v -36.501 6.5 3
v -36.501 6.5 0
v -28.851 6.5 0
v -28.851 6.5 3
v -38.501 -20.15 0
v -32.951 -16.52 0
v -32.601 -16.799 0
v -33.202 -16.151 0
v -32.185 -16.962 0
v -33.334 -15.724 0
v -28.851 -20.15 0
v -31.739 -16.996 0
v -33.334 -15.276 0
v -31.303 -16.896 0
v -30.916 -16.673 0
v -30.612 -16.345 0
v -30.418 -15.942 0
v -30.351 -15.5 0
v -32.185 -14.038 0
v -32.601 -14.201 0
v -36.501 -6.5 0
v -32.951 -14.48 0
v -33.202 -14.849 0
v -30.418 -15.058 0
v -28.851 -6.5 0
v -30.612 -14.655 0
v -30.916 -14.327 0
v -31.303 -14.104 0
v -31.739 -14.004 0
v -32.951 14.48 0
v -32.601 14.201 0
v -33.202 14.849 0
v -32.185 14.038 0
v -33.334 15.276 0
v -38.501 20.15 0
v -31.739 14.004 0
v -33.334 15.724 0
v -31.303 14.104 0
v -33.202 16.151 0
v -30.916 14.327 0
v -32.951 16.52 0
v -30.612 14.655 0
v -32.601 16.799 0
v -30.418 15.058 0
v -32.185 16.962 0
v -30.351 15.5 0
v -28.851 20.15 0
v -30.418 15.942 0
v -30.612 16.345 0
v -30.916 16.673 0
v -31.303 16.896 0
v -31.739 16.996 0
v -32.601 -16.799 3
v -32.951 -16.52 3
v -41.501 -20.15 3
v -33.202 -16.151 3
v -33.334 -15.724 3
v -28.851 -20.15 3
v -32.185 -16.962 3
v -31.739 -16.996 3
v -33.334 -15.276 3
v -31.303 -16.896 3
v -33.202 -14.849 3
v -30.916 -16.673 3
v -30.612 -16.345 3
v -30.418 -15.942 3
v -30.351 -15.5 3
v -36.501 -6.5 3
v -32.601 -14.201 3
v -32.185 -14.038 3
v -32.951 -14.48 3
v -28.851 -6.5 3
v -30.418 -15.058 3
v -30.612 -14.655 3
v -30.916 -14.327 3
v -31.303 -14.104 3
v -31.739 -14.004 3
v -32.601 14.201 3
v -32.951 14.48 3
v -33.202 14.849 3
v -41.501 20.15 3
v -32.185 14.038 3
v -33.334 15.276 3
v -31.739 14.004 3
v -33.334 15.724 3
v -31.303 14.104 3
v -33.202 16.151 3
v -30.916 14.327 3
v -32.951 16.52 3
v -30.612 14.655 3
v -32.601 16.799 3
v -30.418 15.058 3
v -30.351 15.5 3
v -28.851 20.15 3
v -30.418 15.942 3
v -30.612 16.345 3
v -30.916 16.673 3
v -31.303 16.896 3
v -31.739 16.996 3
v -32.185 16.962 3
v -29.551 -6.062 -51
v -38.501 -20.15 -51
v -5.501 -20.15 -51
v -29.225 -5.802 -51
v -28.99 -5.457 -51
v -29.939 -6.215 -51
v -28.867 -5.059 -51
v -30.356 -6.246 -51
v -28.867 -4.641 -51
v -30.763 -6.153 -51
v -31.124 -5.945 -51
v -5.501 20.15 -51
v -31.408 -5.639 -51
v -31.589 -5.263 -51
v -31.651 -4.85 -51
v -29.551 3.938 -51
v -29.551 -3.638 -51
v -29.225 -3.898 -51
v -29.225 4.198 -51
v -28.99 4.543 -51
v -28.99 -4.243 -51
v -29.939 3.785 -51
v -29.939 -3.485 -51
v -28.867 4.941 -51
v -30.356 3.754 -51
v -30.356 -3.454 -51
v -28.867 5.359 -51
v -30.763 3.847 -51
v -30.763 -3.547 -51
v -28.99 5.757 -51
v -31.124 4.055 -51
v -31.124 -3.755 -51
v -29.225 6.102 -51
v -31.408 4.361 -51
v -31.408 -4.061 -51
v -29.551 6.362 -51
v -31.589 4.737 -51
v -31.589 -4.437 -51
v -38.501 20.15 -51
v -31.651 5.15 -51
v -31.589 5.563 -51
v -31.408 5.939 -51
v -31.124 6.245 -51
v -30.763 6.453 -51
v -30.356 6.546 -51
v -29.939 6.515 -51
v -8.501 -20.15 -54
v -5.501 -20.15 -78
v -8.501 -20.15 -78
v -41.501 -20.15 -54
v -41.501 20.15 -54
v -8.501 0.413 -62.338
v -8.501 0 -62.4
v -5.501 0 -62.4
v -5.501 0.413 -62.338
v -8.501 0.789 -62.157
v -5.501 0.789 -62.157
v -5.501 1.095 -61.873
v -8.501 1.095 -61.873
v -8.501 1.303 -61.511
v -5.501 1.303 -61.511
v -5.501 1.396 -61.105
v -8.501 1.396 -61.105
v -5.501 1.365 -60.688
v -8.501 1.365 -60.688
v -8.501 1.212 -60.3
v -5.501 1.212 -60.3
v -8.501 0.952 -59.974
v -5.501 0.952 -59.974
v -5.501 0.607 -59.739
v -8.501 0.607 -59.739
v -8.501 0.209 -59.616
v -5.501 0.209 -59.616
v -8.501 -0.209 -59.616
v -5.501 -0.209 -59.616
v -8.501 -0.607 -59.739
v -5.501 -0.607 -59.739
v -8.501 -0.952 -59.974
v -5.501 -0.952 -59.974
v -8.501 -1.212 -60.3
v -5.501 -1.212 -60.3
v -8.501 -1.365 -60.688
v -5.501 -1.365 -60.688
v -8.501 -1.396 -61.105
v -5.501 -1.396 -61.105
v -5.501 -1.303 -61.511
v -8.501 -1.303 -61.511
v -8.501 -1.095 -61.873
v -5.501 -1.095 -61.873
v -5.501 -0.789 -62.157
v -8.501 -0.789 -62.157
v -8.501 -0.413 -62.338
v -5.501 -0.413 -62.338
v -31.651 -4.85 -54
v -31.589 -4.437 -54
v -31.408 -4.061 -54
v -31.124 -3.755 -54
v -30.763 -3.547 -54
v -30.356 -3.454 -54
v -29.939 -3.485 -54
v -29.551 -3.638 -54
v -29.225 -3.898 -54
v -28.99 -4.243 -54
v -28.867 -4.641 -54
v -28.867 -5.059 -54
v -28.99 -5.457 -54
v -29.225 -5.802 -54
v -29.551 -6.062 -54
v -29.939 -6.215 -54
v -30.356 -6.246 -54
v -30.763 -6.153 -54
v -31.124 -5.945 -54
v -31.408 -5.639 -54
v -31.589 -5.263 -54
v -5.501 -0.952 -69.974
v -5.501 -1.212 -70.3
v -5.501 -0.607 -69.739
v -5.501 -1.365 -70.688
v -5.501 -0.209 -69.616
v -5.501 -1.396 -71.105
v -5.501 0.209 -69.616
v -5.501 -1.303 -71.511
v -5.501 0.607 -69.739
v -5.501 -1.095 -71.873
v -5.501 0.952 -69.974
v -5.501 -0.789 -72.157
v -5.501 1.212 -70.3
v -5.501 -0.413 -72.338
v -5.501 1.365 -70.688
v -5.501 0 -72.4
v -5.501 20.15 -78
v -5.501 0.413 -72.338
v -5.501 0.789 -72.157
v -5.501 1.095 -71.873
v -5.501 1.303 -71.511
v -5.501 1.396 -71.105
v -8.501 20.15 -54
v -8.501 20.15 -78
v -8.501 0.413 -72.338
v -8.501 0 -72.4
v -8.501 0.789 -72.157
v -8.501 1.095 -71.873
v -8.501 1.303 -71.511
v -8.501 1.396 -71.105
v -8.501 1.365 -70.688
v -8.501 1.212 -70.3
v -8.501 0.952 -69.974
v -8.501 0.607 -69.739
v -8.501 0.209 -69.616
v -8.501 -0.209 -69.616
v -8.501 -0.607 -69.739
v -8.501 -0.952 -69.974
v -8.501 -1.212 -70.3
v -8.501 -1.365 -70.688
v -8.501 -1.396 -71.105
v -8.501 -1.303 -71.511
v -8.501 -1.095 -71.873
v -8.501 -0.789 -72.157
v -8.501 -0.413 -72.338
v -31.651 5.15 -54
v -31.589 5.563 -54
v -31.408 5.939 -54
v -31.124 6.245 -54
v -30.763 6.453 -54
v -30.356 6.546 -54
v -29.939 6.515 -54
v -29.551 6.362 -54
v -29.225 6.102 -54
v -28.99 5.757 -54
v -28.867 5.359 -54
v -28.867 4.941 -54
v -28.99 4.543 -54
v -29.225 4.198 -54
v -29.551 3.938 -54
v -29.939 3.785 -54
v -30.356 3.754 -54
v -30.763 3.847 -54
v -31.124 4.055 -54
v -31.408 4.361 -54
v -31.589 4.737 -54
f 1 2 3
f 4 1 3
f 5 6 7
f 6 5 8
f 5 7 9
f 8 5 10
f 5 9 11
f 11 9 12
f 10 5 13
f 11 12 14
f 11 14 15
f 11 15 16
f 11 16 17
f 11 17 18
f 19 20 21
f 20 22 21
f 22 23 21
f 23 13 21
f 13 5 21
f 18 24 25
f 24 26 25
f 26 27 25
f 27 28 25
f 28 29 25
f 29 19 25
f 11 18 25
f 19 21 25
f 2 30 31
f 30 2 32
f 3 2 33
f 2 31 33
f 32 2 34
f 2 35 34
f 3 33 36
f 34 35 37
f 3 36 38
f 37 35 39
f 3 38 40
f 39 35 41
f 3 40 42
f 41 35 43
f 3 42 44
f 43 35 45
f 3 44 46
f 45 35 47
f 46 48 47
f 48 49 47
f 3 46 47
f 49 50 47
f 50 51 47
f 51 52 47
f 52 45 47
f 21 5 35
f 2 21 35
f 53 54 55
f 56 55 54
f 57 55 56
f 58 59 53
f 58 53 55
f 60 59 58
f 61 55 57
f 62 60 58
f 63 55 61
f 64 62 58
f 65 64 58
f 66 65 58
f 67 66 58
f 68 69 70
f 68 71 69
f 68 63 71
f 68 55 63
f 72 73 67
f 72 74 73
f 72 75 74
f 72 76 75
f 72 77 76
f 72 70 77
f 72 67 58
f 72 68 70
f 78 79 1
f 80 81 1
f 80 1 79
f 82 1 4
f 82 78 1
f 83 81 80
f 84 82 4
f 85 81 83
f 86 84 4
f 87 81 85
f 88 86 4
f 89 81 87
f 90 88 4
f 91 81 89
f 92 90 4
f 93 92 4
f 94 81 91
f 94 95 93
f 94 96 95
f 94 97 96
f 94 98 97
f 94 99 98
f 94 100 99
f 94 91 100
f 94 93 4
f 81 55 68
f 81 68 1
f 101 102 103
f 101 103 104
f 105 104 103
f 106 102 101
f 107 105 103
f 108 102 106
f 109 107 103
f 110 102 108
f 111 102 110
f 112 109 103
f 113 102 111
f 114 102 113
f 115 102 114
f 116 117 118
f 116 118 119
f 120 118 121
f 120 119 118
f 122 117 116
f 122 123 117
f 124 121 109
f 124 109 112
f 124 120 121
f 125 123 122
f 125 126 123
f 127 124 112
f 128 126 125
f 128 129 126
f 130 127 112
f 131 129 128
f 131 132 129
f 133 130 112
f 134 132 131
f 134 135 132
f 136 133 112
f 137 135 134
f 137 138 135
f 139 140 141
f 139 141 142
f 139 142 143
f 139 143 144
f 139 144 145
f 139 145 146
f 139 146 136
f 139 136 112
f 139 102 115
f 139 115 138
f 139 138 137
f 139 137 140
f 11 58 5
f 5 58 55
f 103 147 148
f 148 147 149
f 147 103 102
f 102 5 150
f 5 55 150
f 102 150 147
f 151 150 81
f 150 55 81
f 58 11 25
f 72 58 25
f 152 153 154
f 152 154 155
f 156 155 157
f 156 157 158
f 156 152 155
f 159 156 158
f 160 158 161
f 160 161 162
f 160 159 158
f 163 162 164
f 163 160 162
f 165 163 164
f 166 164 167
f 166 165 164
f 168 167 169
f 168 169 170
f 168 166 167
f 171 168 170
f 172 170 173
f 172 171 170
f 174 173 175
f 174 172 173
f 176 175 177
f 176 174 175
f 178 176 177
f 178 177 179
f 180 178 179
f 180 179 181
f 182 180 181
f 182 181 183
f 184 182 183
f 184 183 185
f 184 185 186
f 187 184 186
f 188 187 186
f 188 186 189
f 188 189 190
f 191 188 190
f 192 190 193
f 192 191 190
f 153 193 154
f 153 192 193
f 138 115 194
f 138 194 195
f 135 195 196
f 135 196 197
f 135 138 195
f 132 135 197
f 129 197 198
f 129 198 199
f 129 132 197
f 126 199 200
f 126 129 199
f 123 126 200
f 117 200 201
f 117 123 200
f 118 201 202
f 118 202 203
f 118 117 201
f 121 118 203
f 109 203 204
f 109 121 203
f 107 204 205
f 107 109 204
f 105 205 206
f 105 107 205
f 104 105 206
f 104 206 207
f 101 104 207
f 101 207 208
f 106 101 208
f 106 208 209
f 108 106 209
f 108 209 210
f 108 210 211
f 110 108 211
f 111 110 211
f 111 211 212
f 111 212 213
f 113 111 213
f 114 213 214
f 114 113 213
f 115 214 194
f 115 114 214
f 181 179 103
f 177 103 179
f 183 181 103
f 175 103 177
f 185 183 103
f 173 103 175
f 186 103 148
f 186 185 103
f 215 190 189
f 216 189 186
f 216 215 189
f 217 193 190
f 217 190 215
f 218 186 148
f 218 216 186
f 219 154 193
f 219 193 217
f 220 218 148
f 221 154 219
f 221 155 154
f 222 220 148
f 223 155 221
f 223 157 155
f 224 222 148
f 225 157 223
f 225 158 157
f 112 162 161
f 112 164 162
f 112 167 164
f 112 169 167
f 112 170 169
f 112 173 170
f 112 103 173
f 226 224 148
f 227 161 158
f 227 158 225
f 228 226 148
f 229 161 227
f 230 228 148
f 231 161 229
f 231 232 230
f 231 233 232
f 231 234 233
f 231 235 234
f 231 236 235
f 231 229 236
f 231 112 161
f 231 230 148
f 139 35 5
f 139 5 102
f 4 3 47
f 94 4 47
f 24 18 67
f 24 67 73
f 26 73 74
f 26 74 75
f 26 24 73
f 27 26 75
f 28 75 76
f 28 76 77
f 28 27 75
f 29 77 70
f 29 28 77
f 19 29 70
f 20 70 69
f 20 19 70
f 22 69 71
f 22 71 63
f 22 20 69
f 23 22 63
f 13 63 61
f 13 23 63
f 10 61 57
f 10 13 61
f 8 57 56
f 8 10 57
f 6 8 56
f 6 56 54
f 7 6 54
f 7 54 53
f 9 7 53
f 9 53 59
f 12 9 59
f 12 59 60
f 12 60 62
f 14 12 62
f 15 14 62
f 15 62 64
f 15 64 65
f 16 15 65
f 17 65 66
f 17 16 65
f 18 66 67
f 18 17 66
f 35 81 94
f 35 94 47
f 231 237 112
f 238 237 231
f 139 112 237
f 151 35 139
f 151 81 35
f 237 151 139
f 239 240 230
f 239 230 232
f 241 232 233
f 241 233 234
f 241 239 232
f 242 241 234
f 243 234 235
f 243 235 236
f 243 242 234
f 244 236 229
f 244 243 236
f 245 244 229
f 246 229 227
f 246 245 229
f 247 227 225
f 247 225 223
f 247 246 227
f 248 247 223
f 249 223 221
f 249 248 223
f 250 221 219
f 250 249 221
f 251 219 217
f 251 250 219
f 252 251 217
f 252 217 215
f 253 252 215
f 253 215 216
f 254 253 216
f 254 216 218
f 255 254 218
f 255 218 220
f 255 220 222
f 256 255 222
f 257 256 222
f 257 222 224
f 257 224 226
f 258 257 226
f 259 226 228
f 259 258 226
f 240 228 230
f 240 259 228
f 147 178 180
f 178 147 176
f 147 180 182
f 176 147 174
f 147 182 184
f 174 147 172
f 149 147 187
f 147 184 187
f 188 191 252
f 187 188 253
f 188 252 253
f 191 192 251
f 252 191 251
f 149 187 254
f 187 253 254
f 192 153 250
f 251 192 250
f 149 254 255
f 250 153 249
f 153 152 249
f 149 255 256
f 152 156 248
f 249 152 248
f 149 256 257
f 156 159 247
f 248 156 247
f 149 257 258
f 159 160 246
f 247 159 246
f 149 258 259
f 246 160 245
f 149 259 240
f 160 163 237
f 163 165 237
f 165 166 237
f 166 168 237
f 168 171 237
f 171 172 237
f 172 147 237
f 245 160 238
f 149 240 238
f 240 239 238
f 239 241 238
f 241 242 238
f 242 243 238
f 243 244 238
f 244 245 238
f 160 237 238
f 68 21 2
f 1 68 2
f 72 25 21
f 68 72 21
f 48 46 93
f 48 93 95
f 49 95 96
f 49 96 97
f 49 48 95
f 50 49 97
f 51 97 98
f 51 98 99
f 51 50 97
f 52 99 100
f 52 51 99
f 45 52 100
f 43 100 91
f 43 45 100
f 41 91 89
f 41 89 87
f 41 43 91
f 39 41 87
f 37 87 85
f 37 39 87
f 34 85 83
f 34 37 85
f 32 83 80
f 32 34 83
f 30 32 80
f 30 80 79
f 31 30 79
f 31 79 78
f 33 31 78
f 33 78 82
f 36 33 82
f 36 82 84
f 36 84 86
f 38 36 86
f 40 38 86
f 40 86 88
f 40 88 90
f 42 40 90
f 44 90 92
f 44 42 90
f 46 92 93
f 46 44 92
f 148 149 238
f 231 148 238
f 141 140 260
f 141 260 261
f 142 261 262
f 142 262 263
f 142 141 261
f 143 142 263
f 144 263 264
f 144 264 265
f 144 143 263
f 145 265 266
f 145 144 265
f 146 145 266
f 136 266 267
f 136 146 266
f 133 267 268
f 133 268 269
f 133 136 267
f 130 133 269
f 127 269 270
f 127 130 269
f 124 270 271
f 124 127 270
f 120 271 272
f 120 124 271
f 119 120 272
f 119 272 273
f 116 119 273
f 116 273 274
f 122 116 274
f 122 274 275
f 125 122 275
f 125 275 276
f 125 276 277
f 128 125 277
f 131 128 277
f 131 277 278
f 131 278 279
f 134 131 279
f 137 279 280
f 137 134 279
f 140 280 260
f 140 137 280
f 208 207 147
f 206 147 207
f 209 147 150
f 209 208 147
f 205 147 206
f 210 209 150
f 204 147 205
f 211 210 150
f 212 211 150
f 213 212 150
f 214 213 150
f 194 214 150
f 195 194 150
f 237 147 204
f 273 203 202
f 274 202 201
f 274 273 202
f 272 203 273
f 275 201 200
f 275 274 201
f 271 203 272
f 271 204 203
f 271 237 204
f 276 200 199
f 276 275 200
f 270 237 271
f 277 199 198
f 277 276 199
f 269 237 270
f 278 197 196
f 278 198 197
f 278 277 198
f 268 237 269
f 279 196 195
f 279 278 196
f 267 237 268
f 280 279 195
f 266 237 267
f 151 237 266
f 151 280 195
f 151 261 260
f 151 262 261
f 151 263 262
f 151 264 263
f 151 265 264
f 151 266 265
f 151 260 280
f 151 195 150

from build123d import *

# Parameters (mm, degrees)
SKETCH1_R           = 1.5
BOSS_EXTRUDE1_DEPTH = 3
SKETCH2_W           = 51
SKETCH2_H           = 40.3
BOSS_EXTRUDE2_DEPTH = 3
SKETCH3_W           = 33
SKETCH3_H           = 40.3
SKETCH3_R           = 1.4
BOSS_EXTRUDE3_DEPTH = 3
SKETCH5_W           = 27
SKETCH5_H           = 40.3
SKETCH5_R           = 1.4
BOSS_EXTRUDE4_DEPTH = 3


with BuildPart() as part:
    # Sketch1 → Boss-Extrude1 (new body)
    with BuildSketch(Plane.XY):
        Polygon((-28.851027023, -20.15), (-28.851027023, -13), (-28.851027023, -6.5), (-36.501027023, -6.5), (-36.501027023, -16.735786438), (-33.086813461, -20.15), align=None)
        with Locations((-31.851027023, -15.5)):
            Circle(SKETCH1_R, mode=Mode.SUBTRACT)
        Polygon((-36.501027023, 16.735786438), (-36.501027023, 6.5), (-28.851027023, 6.5), (-28.851027023, 20.15), (-33.086813461, 20.15), align=None)
        with Locations((-31.851027023, 15.5)):
            Circle(SKETCH1_R, mode=Mode.SUBTRACT)
        Polygon((-36.501027023, -20.15), (-33.086813461, -20.15), (-36.501027023, -16.735786438), align=None)
        Polygon((-36.501027023, 20.15), (-36.501027023, 16.735786438), (-33.086813461, 20.15), align=None)
        Polygon((-36.501027023, -16.735786438), (-36.501027023, -6.5), (-36.501027023, 6.5), (-36.501027023, 16.735786438), (-36.501027023, 20.15), (-41.501027023, 20.15), (-41.501027023, -20.15), (-36.501027023, -20.15), align=None)
    extrude(amount=BOSS_EXTRUDE1_DEPTH)

    # Sketch2 → Boss-Extrude2 (add)
    with BuildSketch(Plane(origin=(-41.501027023, 0, 0), x_dir=(0, 0, -1), z_dir=(1, 0, 0))):
        with Locations((25.5, 0)):
            Rectangle(SKETCH2_W, SKETCH2_H)
    extrude(amount=BOSS_EXTRUDE2_DEPTH)

    # Sketch3 → Boss-Extrude3 (add)
    with BuildSketch(Plane(origin=(0, 0, -51), x_dir=(-1, 0, 0), z_dir=(0, 0, -1))):
        with Locations((25.001027023, 0)):
            Rectangle(SKETCH3_W, SKETCH3_H)
        with Locations((30.251027023, 5.15)):
            Circle(SKETCH3_R, mode=Mode.SUBTRACT)
        with Locations((30.251027023, -4.85)):
            Circle(SKETCH3_R, mode=Mode.SUBTRACT)
    extrude(amount=BOSS_EXTRUDE3_DEPTH)

    # Sketch5 → Boss-Extrude4 (add)
    with BuildSketch(Plane(origin=(-8.501027023, 0, 0), x_dir=(0, 0, -1), z_dir=(1, 0, 0))):
        with Locations((64.5, 0)):
            Rectangle(SKETCH5_W, SKETCH5_H)
        with Locations((71, 0)):
            Circle(SKETCH5_R, mode=Mode.SUBTRACT)
        with Locations((61, 0)):
            Circle(SKETCH5_R, mode=Mode.SUBTRACT)
    extrude(amount=BOSS_EXTRUDE4_DEPTH)


solid = part.part
